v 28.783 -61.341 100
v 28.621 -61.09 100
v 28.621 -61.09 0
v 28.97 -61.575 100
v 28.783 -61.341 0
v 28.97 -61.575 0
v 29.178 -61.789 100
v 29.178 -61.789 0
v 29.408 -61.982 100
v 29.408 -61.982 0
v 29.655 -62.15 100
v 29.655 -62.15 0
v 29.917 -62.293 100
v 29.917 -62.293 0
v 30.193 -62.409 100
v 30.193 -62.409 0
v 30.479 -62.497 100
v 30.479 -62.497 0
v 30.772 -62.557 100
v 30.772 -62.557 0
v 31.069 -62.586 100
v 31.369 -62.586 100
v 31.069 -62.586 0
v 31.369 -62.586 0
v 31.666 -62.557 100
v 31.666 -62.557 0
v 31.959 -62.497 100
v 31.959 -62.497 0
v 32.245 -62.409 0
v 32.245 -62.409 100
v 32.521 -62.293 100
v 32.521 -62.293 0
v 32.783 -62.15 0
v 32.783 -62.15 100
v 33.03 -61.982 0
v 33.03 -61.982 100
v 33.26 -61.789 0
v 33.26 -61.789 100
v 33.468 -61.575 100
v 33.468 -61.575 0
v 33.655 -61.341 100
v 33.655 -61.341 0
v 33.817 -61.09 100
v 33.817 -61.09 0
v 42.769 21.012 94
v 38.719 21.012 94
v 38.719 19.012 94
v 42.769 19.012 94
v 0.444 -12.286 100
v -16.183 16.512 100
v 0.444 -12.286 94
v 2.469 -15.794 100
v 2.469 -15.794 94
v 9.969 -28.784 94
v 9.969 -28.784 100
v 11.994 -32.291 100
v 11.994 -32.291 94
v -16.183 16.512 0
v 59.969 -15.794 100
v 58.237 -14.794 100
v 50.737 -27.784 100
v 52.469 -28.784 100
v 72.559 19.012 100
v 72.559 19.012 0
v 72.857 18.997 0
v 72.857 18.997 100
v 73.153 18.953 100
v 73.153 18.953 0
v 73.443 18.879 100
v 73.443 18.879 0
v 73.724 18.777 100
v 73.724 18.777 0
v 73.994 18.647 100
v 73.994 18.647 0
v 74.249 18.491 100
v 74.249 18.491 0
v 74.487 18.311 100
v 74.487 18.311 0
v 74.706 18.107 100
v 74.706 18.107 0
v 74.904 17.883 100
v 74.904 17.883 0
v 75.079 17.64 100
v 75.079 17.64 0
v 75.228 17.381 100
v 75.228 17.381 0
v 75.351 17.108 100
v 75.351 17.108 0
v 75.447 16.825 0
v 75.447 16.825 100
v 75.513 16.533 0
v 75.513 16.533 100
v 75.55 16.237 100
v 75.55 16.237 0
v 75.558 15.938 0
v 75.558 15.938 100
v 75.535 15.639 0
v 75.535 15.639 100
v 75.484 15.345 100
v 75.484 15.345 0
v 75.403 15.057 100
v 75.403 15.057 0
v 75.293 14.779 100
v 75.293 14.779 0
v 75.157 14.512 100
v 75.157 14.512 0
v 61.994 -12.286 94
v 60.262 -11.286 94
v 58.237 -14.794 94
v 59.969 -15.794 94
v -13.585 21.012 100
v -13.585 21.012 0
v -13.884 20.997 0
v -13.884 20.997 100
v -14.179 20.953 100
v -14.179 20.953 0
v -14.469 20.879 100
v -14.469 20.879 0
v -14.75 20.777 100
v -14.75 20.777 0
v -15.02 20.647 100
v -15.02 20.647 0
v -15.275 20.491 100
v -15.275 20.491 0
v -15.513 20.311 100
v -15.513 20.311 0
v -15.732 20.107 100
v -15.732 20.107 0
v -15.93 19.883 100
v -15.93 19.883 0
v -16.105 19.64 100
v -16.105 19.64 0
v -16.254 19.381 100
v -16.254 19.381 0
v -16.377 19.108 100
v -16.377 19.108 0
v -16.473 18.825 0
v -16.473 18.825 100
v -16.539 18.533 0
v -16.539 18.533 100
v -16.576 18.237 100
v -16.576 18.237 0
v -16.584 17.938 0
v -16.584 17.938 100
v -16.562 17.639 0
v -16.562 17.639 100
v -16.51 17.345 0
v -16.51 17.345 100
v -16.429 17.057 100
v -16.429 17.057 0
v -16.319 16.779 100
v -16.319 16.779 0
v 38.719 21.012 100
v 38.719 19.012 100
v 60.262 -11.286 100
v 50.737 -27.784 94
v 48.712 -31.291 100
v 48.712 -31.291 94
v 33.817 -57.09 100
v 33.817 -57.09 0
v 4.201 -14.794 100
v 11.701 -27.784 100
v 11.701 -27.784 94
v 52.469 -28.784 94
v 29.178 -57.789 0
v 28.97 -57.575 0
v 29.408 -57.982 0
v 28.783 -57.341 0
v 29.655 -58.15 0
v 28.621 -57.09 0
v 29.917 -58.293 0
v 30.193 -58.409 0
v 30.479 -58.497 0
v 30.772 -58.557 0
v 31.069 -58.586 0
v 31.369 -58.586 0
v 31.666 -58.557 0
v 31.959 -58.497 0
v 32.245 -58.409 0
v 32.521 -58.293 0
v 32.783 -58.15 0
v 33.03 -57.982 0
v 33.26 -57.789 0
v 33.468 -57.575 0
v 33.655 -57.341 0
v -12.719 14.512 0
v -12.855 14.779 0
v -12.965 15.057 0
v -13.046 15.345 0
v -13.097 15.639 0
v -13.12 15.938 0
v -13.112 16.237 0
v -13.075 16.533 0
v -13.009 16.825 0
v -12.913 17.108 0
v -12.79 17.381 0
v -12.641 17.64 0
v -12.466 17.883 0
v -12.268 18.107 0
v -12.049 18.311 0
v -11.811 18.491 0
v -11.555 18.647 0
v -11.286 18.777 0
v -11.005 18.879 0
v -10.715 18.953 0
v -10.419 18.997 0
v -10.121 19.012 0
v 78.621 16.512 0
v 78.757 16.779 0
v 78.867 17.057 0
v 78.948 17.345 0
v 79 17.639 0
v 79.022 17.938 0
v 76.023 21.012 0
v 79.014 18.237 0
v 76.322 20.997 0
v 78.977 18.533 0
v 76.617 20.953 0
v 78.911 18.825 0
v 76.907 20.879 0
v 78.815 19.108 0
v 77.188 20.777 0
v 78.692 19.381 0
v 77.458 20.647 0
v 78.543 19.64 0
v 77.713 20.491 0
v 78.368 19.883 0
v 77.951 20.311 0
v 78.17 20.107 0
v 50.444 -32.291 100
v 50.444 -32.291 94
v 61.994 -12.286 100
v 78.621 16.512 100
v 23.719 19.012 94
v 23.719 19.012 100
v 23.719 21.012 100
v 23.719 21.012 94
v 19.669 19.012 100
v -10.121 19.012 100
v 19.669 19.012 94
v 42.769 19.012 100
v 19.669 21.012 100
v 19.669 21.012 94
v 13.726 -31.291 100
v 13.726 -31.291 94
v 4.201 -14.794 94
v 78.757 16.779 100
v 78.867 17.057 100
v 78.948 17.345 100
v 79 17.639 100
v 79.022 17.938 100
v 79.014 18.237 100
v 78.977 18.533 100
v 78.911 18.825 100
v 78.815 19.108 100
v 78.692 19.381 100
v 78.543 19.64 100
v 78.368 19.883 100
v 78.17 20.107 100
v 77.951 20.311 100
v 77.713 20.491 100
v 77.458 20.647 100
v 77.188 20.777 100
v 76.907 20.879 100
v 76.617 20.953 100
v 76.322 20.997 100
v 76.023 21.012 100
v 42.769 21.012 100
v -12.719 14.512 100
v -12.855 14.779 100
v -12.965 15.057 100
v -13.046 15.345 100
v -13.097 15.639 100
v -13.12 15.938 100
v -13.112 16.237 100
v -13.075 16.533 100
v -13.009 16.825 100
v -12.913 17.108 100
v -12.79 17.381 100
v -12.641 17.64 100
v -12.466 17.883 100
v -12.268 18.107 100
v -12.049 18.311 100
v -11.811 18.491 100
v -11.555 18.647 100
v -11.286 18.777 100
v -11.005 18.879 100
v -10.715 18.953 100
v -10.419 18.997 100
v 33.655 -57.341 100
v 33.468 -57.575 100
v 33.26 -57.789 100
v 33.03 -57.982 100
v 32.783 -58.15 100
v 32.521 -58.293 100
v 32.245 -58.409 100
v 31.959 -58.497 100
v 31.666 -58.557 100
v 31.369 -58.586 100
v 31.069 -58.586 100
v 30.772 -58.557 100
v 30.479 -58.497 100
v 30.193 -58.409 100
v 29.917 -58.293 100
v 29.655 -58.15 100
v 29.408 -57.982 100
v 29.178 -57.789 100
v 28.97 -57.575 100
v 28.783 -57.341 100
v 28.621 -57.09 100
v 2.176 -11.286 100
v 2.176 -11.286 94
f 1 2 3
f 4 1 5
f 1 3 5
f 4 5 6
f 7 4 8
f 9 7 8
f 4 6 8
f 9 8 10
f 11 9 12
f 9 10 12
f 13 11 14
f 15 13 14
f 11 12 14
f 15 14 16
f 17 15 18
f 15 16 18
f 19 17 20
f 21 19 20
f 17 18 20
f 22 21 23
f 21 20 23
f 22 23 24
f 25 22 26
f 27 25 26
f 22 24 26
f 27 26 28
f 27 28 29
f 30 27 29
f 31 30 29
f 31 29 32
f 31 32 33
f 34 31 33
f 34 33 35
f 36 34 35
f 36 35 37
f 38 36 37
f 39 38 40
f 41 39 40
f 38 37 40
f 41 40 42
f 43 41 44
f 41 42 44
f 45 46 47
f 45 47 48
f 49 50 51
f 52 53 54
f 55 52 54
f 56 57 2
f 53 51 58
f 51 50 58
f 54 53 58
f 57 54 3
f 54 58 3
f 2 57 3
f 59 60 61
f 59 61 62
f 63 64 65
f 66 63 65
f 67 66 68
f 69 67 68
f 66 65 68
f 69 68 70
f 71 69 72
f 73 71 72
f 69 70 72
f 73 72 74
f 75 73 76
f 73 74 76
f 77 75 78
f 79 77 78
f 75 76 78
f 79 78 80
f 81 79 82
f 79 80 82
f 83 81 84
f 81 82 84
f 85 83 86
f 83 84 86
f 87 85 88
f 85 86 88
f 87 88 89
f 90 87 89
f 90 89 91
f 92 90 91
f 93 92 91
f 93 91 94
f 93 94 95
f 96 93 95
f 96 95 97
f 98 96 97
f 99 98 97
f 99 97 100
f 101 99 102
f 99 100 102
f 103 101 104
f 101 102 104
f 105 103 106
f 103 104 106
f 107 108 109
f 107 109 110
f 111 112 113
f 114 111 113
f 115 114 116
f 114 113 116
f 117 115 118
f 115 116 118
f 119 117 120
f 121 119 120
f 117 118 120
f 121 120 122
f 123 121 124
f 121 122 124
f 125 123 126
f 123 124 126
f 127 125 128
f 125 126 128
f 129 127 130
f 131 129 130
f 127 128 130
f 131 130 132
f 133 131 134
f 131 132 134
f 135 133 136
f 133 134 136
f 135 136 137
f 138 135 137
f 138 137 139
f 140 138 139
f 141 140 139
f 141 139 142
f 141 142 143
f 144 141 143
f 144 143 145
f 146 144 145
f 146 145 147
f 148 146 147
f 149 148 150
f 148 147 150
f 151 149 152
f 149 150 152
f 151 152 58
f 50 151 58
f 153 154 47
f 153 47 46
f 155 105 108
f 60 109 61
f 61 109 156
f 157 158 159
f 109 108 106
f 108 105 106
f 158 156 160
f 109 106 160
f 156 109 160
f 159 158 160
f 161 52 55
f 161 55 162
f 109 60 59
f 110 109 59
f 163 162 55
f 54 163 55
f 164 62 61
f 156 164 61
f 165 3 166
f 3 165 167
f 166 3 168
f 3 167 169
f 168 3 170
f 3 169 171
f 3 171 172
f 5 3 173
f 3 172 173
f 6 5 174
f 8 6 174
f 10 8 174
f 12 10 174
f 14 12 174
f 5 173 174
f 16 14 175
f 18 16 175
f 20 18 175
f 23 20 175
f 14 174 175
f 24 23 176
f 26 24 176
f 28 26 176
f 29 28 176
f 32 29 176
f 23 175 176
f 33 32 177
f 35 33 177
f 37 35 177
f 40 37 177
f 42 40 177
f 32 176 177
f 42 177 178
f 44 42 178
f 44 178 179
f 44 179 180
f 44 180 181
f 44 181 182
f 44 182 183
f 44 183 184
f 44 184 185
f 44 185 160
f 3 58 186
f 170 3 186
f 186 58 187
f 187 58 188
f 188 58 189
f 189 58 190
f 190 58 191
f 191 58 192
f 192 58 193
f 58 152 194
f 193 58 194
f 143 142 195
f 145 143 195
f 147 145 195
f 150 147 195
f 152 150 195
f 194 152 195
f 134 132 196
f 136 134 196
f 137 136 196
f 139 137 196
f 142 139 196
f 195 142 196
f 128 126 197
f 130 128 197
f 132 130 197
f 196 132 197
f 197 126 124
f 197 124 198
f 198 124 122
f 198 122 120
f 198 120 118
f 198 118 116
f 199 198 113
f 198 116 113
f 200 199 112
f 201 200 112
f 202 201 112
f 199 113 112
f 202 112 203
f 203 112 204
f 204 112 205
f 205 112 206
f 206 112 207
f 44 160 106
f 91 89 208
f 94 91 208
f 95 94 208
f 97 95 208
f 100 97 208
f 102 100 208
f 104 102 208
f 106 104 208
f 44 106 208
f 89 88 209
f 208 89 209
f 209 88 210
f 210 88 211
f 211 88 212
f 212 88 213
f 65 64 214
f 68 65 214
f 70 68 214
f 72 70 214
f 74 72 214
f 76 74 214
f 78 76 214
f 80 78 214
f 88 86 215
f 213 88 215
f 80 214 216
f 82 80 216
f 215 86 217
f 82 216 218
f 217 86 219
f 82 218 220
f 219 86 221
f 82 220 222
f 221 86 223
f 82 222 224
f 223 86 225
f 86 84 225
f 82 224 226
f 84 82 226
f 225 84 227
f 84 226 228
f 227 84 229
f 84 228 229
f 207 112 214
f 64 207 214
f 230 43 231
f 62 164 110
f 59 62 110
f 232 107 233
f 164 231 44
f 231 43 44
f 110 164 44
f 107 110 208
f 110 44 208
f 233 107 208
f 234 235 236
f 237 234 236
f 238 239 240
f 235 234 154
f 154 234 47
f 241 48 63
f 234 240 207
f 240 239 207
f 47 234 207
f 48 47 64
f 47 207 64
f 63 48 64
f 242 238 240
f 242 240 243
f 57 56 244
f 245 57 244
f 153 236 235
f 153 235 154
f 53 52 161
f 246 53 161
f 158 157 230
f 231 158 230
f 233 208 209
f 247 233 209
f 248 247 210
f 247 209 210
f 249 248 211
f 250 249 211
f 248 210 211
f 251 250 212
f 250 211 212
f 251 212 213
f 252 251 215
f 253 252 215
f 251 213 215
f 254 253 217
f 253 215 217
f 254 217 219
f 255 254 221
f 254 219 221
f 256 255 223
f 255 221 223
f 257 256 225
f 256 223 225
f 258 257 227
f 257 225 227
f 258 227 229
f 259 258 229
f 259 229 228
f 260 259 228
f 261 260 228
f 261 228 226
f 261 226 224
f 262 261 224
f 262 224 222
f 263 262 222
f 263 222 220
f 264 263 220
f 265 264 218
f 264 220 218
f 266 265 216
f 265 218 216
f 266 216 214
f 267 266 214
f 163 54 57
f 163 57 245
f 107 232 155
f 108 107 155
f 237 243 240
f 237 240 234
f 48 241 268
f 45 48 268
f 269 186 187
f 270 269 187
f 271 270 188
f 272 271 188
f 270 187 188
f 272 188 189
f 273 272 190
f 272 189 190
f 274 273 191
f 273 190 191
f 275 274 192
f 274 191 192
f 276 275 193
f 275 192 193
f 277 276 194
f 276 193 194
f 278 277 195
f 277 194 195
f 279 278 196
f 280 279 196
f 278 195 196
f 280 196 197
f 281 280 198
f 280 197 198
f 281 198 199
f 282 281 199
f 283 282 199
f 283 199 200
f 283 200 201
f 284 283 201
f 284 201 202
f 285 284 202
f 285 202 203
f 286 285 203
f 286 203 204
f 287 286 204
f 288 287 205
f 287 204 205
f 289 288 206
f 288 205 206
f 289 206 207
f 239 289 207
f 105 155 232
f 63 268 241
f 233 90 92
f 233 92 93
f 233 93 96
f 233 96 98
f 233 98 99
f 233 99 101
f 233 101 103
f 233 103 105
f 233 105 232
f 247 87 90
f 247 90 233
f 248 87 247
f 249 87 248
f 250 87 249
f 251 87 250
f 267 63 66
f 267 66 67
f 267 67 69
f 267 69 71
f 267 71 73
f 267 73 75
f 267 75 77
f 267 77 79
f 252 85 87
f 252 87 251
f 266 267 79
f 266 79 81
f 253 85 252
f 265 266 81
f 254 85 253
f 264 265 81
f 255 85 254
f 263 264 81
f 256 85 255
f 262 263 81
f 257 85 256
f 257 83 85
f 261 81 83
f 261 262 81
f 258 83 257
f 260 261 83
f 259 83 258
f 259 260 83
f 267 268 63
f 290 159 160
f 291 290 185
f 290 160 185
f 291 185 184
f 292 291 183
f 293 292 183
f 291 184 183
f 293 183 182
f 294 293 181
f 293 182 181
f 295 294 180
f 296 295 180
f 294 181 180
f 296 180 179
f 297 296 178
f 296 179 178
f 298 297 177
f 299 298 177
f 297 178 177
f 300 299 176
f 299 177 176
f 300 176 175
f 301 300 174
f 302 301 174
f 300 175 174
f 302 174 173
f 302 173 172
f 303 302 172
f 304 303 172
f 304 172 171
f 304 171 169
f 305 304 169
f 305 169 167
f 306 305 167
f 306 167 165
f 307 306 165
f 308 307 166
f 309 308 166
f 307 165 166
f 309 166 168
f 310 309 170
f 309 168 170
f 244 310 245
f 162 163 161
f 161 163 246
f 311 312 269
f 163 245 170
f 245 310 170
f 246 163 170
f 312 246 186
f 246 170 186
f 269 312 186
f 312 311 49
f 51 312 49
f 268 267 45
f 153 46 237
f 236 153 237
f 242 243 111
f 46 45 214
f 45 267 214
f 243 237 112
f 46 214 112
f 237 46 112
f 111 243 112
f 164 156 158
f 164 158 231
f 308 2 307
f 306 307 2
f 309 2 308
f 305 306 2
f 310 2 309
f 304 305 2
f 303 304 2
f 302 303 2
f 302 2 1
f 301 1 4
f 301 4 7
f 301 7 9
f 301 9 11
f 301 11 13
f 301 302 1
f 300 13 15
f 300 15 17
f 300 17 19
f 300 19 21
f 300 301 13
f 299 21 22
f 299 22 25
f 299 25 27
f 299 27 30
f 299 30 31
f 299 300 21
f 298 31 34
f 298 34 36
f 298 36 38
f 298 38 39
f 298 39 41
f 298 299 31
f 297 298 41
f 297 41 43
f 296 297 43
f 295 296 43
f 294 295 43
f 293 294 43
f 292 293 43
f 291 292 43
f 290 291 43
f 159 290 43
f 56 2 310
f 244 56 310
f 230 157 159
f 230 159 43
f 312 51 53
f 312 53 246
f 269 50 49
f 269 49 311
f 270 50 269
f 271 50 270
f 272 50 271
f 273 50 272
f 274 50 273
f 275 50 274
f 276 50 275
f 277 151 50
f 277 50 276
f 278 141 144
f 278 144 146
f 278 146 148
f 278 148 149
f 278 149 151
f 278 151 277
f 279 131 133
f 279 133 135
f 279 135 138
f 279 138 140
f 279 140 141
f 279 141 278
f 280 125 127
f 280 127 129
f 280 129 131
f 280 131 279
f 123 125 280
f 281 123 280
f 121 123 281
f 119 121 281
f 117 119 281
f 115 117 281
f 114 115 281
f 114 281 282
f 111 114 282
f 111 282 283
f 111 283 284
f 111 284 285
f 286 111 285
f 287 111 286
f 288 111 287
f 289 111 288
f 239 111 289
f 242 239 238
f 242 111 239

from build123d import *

# Parameters (mm, degrees)
F1_DEPTH = 100
F2_W     = 4.05
F2_H     = 2
F3_DEPTH = 6


with BuildPart() as f1:
    # F0 (on Top) → F1 (new body)
    with BuildSketch(Plane.XY):
        with BuildLine():
            Line((76.0228561422, 21.0123993456), (-13.5848390123, 21.0123993456))
            ThreePointArc((-13.5848390123, 21.0123993456), (-16.1829152237, 19.5123993456), (-16.1829152237, 16.5123993456))
            Line((-16.1829152237, 16.5123993456), (28.6209323536, -61.0901410328))
            ThreePointArc((28.6209323536, -61.0901410328), (31.2190085649, -62.5901410328), (33.8170847763, -61.0901410328))
            Line((33.8170847763, -61.0901410328), (78.6209323536, 16.5123993456))
            ThreePointArc((78.6209323536, 16.5123993456), (78.6209323536, 19.5123993456), (76.0228561422, 21.0123993456))
        make_face()
        with BuildLine():
            ThreePointArc((-12.7188136086, 14.5123993456), (-12.7188136086, 17.5123993456), (-10.1207373972, 19.0123993456))
            Line((-10.1207373972, 19.0123993456), (72.5587545271, 19.0123993456))
            ThreePointArc((72.5587545271, 19.0123993456), (75.1568307385, 17.5123993456), (75.1568307385, 14.5123993456))
            Line((75.1568307385, 14.5123993456), (33.8170847763, -57.0901410328))
            ThreePointArc((33.8170847763, -57.0901410328), (31.2190085649, -58.5901410328), (28.6209323536, -57.0901410328))
            Line((28.6209323536, -57.0901410328), (-12.7188136086, 14.5123993456))
        make_face(mode=Mode.SUBTRACT)
    extrude(amount=F1_DEPTH)

    # F2 (on face) → F3 (cut)
    with BuildSketch(Plane.XY.offset(100)):
        with Locations((21.6940085649, 20.0123993456)):
            Rectangle(F2_W, F2_H)
        with Locations((40.7440085649, 20.0123993456)):
            Rectangle(F2_W, F2_H)
        Polygon((2.1760593725, -11.2862774299), (0.4440085649, -12.2862774299), (2.4690085649, -15.7936803152), (4.2010593725, -14.7936803152), align=None)
        Polygon((11.7010593725, -27.784061372), (9.9690085649, -28.784061372), (11.9940085649, -32.2914642573), (13.7260593725, -31.2914642573), align=None)
        Polygon((61.9940085649, -12.2862774299), (60.2619577574, -11.2862774299), (58.2369577574, -14.7936803152), (59.9690085649, -15.7936803152), align=None)
        Polygon((52.4690085649, -28.784061372), (50.7369577574, -27.784061372), (48.7119577574, -31.2914642573), (50.4440085649, -32.2914642573), align=None)
    extrude(amount=-F3_DEPTH, mode=Mode.SUBTRACT)


solid = f1.part
